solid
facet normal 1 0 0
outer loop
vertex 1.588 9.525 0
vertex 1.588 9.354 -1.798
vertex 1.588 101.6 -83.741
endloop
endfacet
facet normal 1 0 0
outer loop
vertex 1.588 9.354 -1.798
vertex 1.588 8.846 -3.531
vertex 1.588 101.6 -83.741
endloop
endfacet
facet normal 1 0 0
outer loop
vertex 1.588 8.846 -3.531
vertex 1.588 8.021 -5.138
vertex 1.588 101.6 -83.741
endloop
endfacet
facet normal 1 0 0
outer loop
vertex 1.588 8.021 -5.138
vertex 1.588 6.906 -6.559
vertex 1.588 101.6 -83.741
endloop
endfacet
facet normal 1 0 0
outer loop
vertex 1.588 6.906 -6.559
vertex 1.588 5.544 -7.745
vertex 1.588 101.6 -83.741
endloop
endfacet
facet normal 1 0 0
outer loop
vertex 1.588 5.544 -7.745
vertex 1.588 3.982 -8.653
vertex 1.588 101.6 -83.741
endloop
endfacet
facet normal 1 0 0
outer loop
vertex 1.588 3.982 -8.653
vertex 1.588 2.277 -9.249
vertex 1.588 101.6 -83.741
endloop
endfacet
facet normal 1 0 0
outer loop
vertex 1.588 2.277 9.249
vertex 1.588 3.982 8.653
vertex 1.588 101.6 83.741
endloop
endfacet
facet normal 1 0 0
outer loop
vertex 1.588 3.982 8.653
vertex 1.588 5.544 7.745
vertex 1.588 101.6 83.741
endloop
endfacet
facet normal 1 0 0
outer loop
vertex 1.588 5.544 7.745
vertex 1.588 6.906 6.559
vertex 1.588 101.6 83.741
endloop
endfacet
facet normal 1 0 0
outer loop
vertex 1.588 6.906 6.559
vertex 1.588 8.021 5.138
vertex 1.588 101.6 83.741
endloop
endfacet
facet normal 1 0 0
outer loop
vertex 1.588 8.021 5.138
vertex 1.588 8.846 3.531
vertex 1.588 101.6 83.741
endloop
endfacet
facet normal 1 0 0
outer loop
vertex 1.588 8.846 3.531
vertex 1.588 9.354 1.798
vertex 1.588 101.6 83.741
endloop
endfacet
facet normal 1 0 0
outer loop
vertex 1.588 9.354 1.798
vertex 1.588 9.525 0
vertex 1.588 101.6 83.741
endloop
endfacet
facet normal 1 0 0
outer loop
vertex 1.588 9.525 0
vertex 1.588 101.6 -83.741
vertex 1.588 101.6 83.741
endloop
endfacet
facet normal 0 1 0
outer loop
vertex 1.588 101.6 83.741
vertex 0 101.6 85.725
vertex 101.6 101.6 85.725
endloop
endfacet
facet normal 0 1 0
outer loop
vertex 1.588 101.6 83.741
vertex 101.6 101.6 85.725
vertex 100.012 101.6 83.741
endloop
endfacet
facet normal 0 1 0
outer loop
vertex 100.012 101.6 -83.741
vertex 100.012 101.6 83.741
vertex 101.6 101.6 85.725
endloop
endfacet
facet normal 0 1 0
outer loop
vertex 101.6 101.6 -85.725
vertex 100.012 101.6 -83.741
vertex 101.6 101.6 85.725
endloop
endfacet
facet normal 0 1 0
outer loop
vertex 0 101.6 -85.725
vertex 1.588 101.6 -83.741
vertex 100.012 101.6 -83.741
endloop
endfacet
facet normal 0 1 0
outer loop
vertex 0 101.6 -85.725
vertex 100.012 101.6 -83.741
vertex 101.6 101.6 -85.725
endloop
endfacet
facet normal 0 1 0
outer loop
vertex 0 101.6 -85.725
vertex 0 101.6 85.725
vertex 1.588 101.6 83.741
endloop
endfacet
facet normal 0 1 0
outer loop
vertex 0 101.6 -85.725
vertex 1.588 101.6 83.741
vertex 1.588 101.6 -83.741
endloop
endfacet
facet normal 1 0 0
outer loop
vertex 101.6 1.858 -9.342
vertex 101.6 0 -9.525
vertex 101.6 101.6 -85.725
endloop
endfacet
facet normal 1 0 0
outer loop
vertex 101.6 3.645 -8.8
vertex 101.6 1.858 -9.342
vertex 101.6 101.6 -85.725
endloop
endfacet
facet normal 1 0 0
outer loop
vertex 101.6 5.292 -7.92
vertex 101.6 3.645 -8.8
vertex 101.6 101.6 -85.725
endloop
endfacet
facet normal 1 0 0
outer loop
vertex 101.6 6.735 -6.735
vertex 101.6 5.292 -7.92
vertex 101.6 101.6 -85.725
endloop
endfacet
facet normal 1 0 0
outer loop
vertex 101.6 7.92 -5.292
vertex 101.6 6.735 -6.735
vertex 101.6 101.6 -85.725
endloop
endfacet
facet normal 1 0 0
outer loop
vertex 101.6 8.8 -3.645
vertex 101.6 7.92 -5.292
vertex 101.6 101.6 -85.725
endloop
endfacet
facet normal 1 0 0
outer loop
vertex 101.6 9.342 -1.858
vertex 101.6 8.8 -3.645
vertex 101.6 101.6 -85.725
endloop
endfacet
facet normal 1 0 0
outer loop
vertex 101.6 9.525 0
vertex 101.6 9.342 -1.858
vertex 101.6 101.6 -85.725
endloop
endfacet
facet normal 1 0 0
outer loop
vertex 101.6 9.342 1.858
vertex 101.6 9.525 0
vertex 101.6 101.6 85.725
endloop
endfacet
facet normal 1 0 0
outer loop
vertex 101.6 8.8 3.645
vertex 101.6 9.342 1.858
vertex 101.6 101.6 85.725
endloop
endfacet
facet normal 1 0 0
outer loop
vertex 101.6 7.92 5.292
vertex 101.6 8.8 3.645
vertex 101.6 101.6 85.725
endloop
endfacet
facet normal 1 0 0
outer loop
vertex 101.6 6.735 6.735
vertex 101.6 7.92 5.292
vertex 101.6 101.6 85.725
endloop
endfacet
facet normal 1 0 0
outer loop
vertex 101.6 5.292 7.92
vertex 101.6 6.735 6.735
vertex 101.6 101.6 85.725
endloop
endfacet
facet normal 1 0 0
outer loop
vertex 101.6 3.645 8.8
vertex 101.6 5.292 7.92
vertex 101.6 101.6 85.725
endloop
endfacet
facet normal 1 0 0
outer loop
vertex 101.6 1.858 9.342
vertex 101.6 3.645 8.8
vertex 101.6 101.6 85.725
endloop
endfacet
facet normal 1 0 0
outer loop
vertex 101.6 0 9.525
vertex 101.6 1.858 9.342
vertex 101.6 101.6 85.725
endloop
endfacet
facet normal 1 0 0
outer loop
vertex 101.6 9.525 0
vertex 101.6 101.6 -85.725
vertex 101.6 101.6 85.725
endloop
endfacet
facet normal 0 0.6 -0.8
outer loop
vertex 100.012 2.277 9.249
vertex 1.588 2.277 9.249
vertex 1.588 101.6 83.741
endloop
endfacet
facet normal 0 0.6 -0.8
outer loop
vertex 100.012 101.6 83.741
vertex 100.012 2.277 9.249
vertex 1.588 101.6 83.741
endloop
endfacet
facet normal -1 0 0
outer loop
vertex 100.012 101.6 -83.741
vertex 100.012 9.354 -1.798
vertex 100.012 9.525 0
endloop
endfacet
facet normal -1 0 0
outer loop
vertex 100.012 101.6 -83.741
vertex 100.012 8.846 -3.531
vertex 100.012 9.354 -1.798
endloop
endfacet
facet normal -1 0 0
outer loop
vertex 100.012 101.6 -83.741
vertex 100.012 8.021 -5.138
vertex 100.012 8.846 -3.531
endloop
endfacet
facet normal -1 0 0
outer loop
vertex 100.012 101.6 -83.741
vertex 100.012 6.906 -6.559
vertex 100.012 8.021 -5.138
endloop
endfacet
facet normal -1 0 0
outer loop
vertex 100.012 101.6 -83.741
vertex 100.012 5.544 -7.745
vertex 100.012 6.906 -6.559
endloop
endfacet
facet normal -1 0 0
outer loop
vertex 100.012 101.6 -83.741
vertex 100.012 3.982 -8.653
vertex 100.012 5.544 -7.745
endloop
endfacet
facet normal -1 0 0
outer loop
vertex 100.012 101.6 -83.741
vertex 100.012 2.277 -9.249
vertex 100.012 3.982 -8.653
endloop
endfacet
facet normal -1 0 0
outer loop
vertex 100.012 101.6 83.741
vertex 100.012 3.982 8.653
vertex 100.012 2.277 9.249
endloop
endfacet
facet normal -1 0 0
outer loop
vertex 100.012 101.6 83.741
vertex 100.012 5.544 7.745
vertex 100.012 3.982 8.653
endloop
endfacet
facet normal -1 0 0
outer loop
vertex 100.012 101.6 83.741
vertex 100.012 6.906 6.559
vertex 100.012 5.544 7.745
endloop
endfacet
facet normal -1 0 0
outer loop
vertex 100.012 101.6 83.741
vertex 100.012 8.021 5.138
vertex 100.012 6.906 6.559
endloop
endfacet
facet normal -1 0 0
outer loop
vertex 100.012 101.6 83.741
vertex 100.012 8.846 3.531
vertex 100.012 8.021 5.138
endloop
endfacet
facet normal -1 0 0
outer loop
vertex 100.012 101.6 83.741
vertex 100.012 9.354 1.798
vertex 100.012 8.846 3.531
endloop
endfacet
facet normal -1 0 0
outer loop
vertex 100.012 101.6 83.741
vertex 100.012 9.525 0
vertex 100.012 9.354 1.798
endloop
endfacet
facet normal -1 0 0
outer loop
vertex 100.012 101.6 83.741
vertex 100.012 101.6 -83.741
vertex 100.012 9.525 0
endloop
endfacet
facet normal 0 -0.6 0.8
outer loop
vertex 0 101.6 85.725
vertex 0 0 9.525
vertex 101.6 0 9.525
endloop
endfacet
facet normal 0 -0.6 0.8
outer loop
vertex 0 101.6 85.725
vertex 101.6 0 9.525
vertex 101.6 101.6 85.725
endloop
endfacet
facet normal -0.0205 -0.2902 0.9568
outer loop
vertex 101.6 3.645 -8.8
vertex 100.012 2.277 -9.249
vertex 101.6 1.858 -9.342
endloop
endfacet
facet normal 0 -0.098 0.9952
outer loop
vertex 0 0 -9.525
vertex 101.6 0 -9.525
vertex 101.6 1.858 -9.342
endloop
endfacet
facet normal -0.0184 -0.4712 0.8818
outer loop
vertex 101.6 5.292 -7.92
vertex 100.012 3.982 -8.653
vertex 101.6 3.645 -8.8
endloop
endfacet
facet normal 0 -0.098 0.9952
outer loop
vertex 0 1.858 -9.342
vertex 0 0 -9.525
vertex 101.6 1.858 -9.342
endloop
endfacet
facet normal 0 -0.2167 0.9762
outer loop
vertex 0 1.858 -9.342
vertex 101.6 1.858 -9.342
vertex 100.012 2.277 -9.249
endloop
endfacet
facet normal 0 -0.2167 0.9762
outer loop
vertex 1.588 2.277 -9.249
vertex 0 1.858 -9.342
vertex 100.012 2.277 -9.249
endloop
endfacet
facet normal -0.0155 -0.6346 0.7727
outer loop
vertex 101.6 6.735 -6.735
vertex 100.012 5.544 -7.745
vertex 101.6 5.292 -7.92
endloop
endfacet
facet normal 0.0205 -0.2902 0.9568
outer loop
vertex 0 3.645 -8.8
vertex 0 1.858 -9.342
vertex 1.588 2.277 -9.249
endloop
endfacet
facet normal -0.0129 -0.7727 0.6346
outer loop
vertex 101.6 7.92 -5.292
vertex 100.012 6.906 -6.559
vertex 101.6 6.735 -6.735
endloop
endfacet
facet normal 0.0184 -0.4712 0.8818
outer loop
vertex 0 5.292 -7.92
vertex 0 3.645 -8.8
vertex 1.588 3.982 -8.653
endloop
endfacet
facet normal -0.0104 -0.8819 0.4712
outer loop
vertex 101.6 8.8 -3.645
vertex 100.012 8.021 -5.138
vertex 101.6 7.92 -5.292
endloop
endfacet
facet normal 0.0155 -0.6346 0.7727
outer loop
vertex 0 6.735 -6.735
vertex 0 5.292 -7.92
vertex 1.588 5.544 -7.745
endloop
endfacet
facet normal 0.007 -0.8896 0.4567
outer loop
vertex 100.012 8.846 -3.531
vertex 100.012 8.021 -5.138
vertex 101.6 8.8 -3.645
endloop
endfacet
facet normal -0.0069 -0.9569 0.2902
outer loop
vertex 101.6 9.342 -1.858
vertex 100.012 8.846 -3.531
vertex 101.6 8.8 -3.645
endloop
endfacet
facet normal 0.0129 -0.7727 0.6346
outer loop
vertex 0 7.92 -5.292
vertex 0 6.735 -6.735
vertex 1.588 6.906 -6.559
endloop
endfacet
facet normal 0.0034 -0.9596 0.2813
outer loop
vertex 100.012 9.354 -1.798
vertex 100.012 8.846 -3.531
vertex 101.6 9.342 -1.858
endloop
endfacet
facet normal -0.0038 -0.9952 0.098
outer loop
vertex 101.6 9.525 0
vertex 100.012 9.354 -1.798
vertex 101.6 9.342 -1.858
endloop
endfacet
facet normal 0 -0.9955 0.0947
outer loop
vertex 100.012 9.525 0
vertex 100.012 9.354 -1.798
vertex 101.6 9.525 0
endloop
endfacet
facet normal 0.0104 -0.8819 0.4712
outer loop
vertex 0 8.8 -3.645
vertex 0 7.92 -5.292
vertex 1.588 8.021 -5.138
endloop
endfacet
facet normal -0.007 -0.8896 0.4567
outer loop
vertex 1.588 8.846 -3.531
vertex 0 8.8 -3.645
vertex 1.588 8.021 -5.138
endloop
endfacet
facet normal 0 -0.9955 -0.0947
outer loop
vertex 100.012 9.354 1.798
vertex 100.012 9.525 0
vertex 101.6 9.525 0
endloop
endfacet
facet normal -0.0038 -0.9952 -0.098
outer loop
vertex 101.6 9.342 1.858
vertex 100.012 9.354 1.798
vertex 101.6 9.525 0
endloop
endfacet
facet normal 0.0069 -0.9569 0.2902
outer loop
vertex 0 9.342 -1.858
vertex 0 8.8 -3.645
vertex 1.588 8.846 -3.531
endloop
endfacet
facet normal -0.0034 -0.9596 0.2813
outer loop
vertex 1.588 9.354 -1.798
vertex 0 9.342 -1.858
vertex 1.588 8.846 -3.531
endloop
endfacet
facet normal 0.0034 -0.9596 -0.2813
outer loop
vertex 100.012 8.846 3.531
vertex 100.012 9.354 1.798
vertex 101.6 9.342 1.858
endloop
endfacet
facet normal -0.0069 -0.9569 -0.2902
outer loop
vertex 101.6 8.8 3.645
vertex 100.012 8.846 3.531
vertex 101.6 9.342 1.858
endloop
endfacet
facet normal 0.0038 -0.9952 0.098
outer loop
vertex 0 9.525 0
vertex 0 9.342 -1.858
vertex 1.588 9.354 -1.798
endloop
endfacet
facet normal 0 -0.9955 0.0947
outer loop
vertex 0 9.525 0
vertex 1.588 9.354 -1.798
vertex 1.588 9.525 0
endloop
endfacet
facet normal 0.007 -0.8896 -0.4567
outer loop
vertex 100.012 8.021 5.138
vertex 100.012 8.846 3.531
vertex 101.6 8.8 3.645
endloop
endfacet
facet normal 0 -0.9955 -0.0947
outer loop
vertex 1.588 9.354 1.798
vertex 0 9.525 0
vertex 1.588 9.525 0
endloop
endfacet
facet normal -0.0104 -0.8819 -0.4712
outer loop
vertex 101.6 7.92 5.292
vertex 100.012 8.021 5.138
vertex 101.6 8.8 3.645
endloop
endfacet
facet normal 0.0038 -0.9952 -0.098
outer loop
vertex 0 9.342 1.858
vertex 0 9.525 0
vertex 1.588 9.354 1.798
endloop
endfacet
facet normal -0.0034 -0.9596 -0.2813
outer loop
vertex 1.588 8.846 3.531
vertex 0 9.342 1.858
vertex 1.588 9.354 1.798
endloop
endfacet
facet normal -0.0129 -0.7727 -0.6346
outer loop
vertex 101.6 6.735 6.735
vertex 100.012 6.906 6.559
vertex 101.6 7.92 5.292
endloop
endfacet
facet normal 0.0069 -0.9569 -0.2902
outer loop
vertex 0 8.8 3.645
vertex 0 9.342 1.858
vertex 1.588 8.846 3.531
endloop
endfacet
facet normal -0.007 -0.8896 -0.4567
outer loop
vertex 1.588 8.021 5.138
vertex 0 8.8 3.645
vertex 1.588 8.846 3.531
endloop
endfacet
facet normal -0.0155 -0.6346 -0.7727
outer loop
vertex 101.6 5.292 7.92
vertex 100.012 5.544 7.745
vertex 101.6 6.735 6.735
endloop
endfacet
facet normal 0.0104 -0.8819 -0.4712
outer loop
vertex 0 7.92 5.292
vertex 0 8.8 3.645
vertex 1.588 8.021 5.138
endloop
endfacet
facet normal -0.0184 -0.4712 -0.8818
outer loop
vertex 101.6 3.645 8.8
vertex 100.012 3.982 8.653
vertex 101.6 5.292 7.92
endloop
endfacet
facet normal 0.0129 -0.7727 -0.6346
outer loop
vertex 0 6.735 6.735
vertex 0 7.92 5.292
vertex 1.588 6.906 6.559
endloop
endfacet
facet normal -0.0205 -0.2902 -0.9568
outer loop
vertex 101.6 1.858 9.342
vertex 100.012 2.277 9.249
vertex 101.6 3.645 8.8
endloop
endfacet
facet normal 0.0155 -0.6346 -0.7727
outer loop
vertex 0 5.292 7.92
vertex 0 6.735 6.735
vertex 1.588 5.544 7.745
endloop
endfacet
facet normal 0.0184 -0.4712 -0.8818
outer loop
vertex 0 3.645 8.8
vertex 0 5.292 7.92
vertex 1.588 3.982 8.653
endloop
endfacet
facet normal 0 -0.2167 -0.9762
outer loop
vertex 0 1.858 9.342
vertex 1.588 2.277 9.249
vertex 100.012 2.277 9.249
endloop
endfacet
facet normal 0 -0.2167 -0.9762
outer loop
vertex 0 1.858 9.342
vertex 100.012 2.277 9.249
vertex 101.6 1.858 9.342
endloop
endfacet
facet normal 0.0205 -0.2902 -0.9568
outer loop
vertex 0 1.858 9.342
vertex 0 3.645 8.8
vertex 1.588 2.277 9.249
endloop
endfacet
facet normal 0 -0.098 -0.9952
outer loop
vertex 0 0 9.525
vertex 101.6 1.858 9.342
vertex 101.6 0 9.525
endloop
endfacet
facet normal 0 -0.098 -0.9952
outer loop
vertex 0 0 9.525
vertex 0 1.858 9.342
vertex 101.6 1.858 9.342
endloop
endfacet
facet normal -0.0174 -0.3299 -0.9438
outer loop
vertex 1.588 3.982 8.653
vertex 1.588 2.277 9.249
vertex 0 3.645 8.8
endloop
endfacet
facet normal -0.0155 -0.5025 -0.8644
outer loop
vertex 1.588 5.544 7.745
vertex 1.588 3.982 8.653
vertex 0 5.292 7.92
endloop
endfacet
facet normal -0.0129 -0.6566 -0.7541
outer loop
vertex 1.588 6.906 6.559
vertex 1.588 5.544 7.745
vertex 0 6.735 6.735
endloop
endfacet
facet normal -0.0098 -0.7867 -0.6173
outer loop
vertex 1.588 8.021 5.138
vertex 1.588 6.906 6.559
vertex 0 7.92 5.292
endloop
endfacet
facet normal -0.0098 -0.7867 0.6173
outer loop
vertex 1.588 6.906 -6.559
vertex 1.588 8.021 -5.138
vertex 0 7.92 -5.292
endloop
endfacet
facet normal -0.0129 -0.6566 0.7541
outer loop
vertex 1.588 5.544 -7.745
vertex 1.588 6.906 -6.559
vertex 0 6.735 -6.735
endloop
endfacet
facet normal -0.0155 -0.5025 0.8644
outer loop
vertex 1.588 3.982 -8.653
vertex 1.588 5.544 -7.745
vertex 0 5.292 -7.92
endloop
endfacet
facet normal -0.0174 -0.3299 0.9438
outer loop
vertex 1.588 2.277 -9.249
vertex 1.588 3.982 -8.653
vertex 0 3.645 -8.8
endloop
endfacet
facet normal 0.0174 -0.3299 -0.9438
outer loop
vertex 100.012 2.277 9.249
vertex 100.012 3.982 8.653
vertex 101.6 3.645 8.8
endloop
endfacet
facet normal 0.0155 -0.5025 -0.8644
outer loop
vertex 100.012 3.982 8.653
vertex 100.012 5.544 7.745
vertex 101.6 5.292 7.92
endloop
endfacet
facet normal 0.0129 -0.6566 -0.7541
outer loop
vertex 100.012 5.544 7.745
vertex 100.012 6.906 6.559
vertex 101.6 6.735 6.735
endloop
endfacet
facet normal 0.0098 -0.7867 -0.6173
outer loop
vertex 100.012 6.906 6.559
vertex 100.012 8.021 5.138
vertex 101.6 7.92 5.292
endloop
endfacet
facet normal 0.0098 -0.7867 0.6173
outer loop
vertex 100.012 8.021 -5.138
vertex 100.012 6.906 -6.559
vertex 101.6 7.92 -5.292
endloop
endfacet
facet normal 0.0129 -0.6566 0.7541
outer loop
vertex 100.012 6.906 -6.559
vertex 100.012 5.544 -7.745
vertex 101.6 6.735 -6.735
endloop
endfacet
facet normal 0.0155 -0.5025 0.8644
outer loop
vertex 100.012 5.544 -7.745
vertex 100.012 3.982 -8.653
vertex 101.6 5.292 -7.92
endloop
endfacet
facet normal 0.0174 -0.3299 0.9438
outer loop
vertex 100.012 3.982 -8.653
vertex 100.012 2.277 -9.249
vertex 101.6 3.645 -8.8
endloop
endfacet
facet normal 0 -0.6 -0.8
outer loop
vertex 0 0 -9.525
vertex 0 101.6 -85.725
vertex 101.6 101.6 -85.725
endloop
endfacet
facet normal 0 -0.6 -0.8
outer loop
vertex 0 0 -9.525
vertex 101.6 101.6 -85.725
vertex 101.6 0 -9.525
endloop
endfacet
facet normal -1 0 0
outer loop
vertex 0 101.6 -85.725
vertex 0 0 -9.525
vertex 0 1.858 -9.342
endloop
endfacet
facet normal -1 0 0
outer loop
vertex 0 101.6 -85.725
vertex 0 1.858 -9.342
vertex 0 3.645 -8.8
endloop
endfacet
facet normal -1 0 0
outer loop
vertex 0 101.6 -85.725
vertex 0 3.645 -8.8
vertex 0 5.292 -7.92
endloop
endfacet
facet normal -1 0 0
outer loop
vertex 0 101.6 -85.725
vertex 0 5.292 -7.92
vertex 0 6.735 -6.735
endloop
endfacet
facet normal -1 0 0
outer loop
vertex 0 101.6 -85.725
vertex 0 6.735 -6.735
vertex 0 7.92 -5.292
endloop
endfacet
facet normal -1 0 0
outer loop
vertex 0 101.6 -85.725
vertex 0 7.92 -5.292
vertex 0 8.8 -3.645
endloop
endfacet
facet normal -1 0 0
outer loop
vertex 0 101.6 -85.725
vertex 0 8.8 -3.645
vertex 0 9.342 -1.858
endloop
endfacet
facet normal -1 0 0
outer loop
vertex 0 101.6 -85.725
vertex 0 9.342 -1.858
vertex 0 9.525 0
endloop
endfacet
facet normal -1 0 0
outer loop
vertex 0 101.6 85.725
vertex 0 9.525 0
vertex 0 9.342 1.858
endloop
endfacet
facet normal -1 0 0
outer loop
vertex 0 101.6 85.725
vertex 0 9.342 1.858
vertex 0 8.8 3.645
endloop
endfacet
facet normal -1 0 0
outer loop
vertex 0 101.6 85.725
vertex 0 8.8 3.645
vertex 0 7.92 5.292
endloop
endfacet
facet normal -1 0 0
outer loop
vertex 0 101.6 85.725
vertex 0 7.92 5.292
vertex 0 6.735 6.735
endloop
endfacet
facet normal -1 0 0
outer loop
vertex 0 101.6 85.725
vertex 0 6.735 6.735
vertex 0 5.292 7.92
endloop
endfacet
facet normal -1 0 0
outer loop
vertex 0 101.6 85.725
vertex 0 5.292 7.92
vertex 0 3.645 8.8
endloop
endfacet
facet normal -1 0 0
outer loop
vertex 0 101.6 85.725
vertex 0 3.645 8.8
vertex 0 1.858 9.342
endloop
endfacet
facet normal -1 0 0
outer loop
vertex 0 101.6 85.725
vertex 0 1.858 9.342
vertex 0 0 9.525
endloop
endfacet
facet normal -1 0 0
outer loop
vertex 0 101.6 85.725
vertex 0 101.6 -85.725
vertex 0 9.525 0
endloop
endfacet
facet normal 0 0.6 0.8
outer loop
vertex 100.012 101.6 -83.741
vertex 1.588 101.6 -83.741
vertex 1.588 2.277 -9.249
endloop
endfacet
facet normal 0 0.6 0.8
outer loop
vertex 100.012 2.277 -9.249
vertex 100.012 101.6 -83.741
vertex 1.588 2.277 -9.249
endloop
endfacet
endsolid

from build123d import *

# Parameters (mm, degrees)
BOSS_EXTRUDE1_DEPTH = 101.6
SHELL3_T            = -1.5875


with BuildPart() as part:
    # Sketch1 → Boss-Extrude1 (new body)
    with BuildSketch(Plane(origin=(0, 0, 0), x_dir=(0, 0, -1), z_dir=(1, 0, 0))):
        with BuildLine():
            Line((-9.525, 0), (-85.725, 101.6))
            Line((-85.725, 101.6), (85.725, 101.6))
            Line((85.725, 101.6), (9.525, 0))
            ThreePointArc((9.525, 0), (0, 9.525), (-9.525, 0))
        make_face()
    extrude(amount=BOSS_EXTRUDE1_DEPTH)

    # Shell3
    shell3_openings = [part.faces().sort_by_distance(p)[0] for p in [
        (50.8, 101.6, 0),
        (50.8, 4.7625, 0),
    ]]
    offset(amount=SHELL3_T, openings=shell3_openings, kind=Kind.INTERSECTION)


solid = part.part
